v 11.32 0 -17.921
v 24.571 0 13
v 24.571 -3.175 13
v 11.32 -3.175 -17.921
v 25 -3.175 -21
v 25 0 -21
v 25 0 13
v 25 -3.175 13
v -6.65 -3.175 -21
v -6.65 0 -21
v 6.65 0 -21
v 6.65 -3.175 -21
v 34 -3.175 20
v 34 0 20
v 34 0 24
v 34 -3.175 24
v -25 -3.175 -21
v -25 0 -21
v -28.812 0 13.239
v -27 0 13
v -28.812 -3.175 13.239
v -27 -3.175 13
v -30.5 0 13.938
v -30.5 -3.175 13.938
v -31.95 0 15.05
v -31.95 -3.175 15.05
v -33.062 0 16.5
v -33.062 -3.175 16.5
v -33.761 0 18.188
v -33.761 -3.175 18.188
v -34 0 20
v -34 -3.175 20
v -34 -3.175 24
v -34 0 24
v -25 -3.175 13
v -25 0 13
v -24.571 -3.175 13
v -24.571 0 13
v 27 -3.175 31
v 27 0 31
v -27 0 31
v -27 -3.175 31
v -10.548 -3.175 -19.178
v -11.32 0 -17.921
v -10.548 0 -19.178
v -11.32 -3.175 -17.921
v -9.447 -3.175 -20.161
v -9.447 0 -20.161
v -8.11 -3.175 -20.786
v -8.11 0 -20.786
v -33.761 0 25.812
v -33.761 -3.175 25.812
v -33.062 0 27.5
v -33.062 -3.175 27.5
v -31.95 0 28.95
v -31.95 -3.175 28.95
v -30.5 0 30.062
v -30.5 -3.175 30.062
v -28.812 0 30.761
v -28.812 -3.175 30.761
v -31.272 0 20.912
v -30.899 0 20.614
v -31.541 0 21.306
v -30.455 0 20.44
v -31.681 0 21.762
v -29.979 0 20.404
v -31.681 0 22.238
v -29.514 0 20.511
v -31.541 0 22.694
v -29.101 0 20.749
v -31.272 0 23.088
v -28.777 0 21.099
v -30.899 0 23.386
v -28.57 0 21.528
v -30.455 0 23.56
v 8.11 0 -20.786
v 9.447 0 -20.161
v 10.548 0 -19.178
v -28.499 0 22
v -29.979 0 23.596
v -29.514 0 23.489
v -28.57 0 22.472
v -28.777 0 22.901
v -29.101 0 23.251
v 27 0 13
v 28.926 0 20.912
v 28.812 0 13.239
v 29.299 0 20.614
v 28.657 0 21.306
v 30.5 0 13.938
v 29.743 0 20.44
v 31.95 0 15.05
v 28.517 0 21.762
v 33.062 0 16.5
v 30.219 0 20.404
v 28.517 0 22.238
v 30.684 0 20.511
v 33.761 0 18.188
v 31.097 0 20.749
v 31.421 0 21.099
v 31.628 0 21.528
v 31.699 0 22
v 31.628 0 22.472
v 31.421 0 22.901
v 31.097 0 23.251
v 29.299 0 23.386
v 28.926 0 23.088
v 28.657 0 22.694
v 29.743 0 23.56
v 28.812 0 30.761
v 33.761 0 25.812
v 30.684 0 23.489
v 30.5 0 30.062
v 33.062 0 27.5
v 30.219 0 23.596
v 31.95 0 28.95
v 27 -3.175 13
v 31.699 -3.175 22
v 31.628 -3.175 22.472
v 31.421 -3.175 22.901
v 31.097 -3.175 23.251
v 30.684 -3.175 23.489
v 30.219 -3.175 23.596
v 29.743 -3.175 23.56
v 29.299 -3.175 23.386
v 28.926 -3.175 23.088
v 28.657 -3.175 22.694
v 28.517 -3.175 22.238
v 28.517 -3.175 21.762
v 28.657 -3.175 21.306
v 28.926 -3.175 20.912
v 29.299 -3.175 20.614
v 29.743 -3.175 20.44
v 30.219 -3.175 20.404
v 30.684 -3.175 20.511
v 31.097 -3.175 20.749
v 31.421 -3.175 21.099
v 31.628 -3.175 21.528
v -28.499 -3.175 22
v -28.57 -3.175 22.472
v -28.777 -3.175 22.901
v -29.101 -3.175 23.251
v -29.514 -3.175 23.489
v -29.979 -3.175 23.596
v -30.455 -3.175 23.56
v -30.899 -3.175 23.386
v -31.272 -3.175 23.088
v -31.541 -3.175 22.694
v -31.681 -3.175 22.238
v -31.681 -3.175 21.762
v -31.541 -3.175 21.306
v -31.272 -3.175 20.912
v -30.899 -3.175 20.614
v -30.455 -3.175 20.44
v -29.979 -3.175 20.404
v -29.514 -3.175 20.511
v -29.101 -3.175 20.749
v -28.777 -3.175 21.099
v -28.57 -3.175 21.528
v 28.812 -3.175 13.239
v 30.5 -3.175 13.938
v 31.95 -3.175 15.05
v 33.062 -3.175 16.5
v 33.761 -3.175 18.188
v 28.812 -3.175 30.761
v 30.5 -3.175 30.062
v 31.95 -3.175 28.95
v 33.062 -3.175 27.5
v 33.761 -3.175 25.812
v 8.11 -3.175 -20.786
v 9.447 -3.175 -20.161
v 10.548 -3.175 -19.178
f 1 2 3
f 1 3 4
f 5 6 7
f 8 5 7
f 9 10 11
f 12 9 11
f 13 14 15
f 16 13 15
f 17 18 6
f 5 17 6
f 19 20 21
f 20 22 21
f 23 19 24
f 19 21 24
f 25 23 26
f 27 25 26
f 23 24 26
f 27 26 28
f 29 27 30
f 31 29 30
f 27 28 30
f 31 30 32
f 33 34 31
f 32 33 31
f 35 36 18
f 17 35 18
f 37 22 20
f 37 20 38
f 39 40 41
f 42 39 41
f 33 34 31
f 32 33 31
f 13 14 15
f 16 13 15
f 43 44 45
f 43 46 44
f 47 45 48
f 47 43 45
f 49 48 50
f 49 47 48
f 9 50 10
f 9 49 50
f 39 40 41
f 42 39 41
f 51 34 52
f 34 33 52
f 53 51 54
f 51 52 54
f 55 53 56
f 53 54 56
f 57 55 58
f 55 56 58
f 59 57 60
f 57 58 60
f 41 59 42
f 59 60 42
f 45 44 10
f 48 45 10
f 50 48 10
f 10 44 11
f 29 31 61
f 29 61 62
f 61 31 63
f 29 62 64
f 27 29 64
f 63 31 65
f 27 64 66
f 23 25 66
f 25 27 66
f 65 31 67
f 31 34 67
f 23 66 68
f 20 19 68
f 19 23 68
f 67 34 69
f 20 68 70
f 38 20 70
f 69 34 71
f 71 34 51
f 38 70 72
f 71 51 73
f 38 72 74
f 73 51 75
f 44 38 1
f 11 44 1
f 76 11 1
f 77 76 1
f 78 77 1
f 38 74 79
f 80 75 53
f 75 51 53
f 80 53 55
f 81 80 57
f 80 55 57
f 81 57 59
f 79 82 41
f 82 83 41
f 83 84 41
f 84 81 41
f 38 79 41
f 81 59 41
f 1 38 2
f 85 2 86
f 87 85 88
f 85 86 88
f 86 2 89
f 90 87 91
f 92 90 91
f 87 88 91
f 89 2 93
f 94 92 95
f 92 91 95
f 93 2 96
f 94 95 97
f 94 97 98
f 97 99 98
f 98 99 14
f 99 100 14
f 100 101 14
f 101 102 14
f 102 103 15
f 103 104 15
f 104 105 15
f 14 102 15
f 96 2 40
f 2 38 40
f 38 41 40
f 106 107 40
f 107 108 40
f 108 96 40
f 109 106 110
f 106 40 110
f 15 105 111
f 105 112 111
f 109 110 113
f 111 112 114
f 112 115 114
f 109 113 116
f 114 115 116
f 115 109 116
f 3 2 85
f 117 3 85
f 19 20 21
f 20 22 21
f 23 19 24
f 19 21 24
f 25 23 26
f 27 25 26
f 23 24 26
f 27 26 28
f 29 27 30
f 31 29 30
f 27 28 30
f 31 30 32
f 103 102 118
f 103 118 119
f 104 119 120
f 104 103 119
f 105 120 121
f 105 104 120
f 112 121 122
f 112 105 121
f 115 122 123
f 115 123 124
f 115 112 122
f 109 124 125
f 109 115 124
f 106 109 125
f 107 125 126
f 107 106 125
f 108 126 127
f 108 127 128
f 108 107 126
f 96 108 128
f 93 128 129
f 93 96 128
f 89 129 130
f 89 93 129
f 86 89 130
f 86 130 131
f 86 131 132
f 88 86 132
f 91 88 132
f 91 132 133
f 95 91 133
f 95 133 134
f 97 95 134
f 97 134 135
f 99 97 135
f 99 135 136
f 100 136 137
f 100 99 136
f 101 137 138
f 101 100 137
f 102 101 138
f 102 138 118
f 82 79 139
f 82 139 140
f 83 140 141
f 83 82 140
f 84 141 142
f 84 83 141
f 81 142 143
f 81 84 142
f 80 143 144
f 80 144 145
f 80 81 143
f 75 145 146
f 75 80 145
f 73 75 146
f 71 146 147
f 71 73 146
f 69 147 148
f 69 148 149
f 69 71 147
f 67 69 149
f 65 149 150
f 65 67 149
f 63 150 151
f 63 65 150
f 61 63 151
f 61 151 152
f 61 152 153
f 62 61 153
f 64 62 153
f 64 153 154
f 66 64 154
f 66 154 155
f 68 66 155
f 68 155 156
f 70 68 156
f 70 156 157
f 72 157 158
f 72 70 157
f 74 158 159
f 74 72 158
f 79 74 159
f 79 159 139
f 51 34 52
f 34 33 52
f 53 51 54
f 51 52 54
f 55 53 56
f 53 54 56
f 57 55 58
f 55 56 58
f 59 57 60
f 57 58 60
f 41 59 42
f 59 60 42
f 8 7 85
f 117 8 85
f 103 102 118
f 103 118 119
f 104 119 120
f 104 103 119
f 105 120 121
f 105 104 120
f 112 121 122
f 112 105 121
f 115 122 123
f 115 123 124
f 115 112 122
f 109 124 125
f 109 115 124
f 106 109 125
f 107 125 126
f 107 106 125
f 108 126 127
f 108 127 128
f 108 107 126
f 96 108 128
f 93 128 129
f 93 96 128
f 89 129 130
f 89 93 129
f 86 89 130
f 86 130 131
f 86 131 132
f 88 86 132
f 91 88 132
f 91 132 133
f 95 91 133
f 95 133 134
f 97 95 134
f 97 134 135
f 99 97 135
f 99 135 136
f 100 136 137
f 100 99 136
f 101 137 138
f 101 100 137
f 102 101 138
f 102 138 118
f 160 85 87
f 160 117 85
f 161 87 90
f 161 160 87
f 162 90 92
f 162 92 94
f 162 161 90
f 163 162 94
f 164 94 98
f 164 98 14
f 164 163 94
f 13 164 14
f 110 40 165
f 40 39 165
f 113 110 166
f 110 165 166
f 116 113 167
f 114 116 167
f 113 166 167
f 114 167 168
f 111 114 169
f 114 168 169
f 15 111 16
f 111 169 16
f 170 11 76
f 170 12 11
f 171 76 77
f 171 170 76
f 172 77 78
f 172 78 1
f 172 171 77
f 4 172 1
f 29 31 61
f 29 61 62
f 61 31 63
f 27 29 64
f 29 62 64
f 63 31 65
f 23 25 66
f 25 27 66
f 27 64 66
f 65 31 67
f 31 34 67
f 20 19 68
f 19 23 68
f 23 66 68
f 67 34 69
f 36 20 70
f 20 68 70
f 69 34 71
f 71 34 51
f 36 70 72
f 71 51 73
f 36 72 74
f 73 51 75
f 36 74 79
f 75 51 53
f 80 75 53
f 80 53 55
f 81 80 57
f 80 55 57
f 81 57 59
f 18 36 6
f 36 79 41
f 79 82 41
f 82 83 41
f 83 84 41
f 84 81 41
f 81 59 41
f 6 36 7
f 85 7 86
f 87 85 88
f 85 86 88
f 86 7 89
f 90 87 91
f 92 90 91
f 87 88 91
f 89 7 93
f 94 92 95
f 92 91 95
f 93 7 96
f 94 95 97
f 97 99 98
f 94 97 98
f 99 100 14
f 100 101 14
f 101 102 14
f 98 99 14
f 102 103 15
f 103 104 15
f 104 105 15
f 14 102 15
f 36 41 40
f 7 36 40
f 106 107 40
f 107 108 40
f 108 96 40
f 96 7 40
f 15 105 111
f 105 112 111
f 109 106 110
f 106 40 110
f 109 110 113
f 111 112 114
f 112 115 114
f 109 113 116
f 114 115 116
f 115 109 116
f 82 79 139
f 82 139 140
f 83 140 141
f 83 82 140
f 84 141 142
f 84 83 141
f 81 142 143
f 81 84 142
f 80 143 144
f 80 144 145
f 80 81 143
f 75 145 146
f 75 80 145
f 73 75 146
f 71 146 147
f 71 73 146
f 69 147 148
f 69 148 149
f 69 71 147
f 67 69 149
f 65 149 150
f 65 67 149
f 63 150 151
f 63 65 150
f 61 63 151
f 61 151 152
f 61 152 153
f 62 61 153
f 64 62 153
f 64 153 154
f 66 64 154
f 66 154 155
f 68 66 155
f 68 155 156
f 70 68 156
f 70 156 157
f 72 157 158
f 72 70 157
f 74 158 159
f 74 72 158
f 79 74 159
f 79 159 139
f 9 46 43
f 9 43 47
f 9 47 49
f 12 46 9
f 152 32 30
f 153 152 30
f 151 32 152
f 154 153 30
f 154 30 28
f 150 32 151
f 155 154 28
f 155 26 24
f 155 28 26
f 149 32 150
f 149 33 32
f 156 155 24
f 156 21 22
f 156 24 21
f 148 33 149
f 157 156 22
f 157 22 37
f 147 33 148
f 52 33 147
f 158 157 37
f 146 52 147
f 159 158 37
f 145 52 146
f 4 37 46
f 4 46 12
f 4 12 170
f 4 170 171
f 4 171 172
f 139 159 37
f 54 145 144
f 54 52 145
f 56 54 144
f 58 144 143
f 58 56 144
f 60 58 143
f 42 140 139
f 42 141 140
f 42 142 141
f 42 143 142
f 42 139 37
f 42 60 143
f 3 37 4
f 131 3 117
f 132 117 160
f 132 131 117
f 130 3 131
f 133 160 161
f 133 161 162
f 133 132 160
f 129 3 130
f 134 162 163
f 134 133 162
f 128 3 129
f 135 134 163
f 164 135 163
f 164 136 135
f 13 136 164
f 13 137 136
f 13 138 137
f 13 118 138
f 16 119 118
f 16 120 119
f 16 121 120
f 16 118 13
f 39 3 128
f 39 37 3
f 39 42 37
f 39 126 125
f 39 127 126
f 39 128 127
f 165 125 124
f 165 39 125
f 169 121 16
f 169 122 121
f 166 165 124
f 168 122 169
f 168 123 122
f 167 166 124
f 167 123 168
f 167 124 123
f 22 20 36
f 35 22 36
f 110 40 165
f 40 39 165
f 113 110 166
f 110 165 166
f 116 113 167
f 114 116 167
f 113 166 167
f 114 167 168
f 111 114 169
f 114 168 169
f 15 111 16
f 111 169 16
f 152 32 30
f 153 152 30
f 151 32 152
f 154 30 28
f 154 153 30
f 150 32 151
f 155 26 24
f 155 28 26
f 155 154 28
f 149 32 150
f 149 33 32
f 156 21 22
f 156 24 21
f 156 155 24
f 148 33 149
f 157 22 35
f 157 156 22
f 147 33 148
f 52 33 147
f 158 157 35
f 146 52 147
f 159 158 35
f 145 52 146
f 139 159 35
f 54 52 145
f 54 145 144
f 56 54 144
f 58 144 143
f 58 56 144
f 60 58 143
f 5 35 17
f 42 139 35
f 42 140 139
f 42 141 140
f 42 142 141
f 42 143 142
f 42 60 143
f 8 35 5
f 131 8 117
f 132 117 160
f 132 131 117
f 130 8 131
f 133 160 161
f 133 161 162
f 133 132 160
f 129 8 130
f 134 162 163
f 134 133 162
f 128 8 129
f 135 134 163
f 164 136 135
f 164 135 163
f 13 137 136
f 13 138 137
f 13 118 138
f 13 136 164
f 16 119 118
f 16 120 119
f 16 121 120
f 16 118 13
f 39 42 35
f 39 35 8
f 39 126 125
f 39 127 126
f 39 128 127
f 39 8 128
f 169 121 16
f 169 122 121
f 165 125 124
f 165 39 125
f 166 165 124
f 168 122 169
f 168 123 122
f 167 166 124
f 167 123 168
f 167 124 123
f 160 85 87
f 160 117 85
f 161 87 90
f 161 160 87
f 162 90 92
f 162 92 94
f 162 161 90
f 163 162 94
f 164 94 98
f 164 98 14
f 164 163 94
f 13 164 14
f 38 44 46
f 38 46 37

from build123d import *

# Parameters (mm, degrees)
F0_R        = 1.6
F1_DEPTH    = 3.175
F2_R        = 7
F4_T4_DEPTH = 184.6299677566
F4_T9_DEPTH = 184.6299677566
F5_R        = 5.08


# Not quite as in the source:
# - a fillet or chamfer that OpenCascade refuses, or shapes differently, is made with other operations: its cross-section is extruded or revolved along the edge and cut away or added


with BuildPart() as f1:
    # F0 (on Front) → F1 (new body)
    with BuildSketch(Plane.XZ):
        Polygon((-25, 13), (-25, -21), (25, -21), (25, 13), (34, 13), (34, 22), (34, 31), (0, 31), (-34, 31), (-34, 24), (-34, 13), align=None)
        with Locations((-30.099, 22)):
            Circle(F0_R, mode=Mode.SUBTRACT)
        with Locations((30.099, 22)):
            Circle(F0_R, mode=Mode.SUBTRACT)
    extrude(amount=F1_DEPTH)

    # F2
    f2_edges = [f1.edges().sort_by_distance(p)[0] for p in [
        (-34, -1.5875, 31),
        (-34, -1.5875, 13),
        (34, -1.5875, 31),
        (34, -1.5875, 13),
    ]]
    fillet(f2_edges, radius=F2_R)


with BuildPart() as f3_1:
    # F3: copy of F1
    add(f1.part)


with BuildPart() as f1_1:
    add(f1.part)

    # F4: chamfer of 15 x 35 on 2 edges, made by hand


with BuildPart() as f4_tool2:
    # F4_s3 → F4_t4 (new body)
    with BuildSketch(Plane.XZ.offset(-90.7274838783)):
        Polygon((-10, -21), (-25, 14), (-25, -21), align=None)
    extrude(amount=F4_T4_DEPTH)

    split(bisect_by=Plane.XY.offset(13), keep=Keep.BOTTOM)


with BuildPart() as f1_2:
    add(f1_1.part)

    # F4_t1: cut F4_tool2
    add(f4_tool2.part, mode=Mode.SUBTRACT)


with BuildPart() as f4_tool7:
    # F4_s8 → F4_t9 (new body)
    with BuildSketch(Plane.XZ.offset(-90.7274838783)):
        Polygon((25, 14), (10, -21), (25, -21), align=None)
    extrude(amount=F4_T9_DEPTH)

    split(bisect_by=Plane.XY.offset(13), keep=Keep.BOTTOM)


with BuildPart() as f1_3:
    add(f1_2.part)

    # F4_t6: cut F4_tool7
    add(f4_tool7.part, mode=Mode.SUBTRACT)

    # F5
    f5_edges = [f1_3.edges().sort_by_distance(p)[0] for p in [
        (-10, -1.5875, -21),
        (10, -1.5875, -21),
    ]]
    fillet(f5_edges, radius=F5_R)


solid = Compound([f3_1.part, f1_3.part])
